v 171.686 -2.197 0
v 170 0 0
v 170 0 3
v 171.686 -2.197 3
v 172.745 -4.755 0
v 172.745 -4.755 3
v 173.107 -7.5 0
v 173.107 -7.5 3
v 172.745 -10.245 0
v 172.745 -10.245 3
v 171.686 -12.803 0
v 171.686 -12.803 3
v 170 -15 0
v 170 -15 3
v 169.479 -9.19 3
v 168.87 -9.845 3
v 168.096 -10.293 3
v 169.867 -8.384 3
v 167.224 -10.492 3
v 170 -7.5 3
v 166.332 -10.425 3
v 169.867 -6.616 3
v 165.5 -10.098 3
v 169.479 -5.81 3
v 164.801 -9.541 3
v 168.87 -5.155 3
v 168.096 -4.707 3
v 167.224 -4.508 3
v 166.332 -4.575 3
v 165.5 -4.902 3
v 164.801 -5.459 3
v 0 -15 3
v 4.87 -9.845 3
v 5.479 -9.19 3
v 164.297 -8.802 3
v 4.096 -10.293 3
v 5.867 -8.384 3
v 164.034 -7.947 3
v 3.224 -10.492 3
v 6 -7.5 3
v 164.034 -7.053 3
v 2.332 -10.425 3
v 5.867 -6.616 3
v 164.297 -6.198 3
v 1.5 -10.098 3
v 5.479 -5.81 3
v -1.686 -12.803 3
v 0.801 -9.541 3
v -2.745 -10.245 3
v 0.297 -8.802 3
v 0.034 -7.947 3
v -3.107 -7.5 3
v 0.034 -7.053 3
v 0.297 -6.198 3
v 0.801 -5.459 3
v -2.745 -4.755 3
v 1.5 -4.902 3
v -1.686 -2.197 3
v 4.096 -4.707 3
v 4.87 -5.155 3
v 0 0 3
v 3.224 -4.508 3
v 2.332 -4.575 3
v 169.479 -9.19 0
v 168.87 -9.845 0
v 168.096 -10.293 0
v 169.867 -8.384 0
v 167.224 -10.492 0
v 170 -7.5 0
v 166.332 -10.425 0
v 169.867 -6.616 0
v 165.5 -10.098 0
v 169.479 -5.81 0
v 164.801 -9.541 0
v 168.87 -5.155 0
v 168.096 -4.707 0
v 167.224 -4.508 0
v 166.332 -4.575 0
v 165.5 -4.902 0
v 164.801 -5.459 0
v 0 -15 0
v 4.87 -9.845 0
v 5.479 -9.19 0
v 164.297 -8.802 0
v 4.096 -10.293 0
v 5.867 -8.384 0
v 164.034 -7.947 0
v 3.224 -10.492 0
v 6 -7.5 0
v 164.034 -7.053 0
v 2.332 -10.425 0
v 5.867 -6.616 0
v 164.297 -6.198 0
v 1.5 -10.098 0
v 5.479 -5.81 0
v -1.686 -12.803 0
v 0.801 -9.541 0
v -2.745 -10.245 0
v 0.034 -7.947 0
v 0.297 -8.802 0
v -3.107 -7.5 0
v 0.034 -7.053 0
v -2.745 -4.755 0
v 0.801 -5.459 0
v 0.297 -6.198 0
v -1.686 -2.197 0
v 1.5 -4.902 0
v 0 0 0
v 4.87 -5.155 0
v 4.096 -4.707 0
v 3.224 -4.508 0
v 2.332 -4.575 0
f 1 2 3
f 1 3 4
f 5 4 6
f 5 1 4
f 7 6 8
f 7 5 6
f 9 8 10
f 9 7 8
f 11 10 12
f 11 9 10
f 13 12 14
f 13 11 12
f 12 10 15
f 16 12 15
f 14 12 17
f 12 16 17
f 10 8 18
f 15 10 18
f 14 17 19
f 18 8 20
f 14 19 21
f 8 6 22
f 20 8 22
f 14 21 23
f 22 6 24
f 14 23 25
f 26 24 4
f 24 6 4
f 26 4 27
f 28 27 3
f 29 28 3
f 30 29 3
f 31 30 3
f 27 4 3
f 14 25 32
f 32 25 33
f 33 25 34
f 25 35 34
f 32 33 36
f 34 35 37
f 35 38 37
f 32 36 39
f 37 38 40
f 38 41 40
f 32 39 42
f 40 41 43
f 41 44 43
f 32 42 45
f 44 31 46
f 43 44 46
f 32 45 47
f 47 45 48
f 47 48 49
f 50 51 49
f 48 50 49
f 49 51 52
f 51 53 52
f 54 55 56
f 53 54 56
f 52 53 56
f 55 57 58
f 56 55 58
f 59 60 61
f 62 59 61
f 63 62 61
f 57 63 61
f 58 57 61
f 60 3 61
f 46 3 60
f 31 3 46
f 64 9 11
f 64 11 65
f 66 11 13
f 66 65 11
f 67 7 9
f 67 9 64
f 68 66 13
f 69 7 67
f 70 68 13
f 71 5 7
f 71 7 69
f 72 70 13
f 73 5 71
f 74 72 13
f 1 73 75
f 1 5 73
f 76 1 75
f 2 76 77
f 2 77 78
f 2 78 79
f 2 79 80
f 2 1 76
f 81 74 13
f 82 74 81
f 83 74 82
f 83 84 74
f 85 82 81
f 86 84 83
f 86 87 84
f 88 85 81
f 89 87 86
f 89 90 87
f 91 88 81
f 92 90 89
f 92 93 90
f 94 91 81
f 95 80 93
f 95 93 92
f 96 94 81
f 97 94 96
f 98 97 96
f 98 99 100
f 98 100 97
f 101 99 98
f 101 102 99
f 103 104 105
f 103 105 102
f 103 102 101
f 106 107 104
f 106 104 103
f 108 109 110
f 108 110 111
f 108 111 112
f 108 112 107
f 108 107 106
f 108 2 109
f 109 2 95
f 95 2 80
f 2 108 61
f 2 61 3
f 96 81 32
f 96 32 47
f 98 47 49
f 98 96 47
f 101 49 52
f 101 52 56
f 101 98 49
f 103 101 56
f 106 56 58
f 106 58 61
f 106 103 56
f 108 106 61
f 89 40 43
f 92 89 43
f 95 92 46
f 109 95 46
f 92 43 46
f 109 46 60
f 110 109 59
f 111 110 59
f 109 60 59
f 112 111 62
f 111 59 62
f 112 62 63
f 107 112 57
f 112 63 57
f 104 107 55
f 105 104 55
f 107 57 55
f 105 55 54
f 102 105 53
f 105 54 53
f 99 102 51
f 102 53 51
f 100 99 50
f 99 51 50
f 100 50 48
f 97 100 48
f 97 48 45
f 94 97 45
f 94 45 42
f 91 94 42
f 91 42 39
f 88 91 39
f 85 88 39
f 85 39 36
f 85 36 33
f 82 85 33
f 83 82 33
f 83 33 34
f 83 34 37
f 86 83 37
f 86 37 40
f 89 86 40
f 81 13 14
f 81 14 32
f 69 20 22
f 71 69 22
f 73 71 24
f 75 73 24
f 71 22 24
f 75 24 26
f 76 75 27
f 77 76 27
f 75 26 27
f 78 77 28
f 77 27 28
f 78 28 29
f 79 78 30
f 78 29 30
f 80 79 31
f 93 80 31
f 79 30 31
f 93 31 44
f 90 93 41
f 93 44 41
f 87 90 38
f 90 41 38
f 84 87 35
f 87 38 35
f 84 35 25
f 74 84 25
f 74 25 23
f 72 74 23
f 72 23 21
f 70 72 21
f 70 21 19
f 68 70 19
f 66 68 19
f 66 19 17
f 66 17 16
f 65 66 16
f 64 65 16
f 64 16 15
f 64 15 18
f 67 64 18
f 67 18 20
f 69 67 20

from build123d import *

# Parameters (mm, degrees)
BOSS_EXTRUDE1_DEPTH = 3
SKETCH2_R           = 3
CUT_EXTRUDE1_DEPTH  = 10
SKETCH3_R           = 3
CUT_EXTRUDE2_DEPTH  = 10


with BuildPart() as part:
    # Sketch1 → Boss-Extrude1 (new body)
    with BuildSketch(Plane.XY):
        with BuildLine():
            Line((0, 0), (170, 0))
            ThreePointArc((170, 0), (173.106601718, -7.5), (170, -15))
            Line((170, -15), (0, -15))
            ThreePointArc((0, -15), (-3.106601718, -7.5), (0, 0))
        make_face()
    extrude(amount=BOSS_EXTRUDE1_DEPTH)

    # Sketch2 → Cut-Extrude1 (cut)
    with BuildSketch(Plane.XY.offset(3)):
        with Locations((3, -7.5)):
            Circle(SKETCH2_R)
    extrude(amount=-CUT_EXTRUDE1_DEPTH, mode=Mode.SUBTRACT)

    # Sketch3 → Cut-Extrude2 (cut)
    with BuildSketch(Plane.XY.offset(3)):
        with Locations((167, -7.5)):
            Circle(SKETCH3_R)
    extrude(amount=-CUT_EXTRUDE2_DEPTH, mode=Mode.SUBTRACT)


solid = part.part
